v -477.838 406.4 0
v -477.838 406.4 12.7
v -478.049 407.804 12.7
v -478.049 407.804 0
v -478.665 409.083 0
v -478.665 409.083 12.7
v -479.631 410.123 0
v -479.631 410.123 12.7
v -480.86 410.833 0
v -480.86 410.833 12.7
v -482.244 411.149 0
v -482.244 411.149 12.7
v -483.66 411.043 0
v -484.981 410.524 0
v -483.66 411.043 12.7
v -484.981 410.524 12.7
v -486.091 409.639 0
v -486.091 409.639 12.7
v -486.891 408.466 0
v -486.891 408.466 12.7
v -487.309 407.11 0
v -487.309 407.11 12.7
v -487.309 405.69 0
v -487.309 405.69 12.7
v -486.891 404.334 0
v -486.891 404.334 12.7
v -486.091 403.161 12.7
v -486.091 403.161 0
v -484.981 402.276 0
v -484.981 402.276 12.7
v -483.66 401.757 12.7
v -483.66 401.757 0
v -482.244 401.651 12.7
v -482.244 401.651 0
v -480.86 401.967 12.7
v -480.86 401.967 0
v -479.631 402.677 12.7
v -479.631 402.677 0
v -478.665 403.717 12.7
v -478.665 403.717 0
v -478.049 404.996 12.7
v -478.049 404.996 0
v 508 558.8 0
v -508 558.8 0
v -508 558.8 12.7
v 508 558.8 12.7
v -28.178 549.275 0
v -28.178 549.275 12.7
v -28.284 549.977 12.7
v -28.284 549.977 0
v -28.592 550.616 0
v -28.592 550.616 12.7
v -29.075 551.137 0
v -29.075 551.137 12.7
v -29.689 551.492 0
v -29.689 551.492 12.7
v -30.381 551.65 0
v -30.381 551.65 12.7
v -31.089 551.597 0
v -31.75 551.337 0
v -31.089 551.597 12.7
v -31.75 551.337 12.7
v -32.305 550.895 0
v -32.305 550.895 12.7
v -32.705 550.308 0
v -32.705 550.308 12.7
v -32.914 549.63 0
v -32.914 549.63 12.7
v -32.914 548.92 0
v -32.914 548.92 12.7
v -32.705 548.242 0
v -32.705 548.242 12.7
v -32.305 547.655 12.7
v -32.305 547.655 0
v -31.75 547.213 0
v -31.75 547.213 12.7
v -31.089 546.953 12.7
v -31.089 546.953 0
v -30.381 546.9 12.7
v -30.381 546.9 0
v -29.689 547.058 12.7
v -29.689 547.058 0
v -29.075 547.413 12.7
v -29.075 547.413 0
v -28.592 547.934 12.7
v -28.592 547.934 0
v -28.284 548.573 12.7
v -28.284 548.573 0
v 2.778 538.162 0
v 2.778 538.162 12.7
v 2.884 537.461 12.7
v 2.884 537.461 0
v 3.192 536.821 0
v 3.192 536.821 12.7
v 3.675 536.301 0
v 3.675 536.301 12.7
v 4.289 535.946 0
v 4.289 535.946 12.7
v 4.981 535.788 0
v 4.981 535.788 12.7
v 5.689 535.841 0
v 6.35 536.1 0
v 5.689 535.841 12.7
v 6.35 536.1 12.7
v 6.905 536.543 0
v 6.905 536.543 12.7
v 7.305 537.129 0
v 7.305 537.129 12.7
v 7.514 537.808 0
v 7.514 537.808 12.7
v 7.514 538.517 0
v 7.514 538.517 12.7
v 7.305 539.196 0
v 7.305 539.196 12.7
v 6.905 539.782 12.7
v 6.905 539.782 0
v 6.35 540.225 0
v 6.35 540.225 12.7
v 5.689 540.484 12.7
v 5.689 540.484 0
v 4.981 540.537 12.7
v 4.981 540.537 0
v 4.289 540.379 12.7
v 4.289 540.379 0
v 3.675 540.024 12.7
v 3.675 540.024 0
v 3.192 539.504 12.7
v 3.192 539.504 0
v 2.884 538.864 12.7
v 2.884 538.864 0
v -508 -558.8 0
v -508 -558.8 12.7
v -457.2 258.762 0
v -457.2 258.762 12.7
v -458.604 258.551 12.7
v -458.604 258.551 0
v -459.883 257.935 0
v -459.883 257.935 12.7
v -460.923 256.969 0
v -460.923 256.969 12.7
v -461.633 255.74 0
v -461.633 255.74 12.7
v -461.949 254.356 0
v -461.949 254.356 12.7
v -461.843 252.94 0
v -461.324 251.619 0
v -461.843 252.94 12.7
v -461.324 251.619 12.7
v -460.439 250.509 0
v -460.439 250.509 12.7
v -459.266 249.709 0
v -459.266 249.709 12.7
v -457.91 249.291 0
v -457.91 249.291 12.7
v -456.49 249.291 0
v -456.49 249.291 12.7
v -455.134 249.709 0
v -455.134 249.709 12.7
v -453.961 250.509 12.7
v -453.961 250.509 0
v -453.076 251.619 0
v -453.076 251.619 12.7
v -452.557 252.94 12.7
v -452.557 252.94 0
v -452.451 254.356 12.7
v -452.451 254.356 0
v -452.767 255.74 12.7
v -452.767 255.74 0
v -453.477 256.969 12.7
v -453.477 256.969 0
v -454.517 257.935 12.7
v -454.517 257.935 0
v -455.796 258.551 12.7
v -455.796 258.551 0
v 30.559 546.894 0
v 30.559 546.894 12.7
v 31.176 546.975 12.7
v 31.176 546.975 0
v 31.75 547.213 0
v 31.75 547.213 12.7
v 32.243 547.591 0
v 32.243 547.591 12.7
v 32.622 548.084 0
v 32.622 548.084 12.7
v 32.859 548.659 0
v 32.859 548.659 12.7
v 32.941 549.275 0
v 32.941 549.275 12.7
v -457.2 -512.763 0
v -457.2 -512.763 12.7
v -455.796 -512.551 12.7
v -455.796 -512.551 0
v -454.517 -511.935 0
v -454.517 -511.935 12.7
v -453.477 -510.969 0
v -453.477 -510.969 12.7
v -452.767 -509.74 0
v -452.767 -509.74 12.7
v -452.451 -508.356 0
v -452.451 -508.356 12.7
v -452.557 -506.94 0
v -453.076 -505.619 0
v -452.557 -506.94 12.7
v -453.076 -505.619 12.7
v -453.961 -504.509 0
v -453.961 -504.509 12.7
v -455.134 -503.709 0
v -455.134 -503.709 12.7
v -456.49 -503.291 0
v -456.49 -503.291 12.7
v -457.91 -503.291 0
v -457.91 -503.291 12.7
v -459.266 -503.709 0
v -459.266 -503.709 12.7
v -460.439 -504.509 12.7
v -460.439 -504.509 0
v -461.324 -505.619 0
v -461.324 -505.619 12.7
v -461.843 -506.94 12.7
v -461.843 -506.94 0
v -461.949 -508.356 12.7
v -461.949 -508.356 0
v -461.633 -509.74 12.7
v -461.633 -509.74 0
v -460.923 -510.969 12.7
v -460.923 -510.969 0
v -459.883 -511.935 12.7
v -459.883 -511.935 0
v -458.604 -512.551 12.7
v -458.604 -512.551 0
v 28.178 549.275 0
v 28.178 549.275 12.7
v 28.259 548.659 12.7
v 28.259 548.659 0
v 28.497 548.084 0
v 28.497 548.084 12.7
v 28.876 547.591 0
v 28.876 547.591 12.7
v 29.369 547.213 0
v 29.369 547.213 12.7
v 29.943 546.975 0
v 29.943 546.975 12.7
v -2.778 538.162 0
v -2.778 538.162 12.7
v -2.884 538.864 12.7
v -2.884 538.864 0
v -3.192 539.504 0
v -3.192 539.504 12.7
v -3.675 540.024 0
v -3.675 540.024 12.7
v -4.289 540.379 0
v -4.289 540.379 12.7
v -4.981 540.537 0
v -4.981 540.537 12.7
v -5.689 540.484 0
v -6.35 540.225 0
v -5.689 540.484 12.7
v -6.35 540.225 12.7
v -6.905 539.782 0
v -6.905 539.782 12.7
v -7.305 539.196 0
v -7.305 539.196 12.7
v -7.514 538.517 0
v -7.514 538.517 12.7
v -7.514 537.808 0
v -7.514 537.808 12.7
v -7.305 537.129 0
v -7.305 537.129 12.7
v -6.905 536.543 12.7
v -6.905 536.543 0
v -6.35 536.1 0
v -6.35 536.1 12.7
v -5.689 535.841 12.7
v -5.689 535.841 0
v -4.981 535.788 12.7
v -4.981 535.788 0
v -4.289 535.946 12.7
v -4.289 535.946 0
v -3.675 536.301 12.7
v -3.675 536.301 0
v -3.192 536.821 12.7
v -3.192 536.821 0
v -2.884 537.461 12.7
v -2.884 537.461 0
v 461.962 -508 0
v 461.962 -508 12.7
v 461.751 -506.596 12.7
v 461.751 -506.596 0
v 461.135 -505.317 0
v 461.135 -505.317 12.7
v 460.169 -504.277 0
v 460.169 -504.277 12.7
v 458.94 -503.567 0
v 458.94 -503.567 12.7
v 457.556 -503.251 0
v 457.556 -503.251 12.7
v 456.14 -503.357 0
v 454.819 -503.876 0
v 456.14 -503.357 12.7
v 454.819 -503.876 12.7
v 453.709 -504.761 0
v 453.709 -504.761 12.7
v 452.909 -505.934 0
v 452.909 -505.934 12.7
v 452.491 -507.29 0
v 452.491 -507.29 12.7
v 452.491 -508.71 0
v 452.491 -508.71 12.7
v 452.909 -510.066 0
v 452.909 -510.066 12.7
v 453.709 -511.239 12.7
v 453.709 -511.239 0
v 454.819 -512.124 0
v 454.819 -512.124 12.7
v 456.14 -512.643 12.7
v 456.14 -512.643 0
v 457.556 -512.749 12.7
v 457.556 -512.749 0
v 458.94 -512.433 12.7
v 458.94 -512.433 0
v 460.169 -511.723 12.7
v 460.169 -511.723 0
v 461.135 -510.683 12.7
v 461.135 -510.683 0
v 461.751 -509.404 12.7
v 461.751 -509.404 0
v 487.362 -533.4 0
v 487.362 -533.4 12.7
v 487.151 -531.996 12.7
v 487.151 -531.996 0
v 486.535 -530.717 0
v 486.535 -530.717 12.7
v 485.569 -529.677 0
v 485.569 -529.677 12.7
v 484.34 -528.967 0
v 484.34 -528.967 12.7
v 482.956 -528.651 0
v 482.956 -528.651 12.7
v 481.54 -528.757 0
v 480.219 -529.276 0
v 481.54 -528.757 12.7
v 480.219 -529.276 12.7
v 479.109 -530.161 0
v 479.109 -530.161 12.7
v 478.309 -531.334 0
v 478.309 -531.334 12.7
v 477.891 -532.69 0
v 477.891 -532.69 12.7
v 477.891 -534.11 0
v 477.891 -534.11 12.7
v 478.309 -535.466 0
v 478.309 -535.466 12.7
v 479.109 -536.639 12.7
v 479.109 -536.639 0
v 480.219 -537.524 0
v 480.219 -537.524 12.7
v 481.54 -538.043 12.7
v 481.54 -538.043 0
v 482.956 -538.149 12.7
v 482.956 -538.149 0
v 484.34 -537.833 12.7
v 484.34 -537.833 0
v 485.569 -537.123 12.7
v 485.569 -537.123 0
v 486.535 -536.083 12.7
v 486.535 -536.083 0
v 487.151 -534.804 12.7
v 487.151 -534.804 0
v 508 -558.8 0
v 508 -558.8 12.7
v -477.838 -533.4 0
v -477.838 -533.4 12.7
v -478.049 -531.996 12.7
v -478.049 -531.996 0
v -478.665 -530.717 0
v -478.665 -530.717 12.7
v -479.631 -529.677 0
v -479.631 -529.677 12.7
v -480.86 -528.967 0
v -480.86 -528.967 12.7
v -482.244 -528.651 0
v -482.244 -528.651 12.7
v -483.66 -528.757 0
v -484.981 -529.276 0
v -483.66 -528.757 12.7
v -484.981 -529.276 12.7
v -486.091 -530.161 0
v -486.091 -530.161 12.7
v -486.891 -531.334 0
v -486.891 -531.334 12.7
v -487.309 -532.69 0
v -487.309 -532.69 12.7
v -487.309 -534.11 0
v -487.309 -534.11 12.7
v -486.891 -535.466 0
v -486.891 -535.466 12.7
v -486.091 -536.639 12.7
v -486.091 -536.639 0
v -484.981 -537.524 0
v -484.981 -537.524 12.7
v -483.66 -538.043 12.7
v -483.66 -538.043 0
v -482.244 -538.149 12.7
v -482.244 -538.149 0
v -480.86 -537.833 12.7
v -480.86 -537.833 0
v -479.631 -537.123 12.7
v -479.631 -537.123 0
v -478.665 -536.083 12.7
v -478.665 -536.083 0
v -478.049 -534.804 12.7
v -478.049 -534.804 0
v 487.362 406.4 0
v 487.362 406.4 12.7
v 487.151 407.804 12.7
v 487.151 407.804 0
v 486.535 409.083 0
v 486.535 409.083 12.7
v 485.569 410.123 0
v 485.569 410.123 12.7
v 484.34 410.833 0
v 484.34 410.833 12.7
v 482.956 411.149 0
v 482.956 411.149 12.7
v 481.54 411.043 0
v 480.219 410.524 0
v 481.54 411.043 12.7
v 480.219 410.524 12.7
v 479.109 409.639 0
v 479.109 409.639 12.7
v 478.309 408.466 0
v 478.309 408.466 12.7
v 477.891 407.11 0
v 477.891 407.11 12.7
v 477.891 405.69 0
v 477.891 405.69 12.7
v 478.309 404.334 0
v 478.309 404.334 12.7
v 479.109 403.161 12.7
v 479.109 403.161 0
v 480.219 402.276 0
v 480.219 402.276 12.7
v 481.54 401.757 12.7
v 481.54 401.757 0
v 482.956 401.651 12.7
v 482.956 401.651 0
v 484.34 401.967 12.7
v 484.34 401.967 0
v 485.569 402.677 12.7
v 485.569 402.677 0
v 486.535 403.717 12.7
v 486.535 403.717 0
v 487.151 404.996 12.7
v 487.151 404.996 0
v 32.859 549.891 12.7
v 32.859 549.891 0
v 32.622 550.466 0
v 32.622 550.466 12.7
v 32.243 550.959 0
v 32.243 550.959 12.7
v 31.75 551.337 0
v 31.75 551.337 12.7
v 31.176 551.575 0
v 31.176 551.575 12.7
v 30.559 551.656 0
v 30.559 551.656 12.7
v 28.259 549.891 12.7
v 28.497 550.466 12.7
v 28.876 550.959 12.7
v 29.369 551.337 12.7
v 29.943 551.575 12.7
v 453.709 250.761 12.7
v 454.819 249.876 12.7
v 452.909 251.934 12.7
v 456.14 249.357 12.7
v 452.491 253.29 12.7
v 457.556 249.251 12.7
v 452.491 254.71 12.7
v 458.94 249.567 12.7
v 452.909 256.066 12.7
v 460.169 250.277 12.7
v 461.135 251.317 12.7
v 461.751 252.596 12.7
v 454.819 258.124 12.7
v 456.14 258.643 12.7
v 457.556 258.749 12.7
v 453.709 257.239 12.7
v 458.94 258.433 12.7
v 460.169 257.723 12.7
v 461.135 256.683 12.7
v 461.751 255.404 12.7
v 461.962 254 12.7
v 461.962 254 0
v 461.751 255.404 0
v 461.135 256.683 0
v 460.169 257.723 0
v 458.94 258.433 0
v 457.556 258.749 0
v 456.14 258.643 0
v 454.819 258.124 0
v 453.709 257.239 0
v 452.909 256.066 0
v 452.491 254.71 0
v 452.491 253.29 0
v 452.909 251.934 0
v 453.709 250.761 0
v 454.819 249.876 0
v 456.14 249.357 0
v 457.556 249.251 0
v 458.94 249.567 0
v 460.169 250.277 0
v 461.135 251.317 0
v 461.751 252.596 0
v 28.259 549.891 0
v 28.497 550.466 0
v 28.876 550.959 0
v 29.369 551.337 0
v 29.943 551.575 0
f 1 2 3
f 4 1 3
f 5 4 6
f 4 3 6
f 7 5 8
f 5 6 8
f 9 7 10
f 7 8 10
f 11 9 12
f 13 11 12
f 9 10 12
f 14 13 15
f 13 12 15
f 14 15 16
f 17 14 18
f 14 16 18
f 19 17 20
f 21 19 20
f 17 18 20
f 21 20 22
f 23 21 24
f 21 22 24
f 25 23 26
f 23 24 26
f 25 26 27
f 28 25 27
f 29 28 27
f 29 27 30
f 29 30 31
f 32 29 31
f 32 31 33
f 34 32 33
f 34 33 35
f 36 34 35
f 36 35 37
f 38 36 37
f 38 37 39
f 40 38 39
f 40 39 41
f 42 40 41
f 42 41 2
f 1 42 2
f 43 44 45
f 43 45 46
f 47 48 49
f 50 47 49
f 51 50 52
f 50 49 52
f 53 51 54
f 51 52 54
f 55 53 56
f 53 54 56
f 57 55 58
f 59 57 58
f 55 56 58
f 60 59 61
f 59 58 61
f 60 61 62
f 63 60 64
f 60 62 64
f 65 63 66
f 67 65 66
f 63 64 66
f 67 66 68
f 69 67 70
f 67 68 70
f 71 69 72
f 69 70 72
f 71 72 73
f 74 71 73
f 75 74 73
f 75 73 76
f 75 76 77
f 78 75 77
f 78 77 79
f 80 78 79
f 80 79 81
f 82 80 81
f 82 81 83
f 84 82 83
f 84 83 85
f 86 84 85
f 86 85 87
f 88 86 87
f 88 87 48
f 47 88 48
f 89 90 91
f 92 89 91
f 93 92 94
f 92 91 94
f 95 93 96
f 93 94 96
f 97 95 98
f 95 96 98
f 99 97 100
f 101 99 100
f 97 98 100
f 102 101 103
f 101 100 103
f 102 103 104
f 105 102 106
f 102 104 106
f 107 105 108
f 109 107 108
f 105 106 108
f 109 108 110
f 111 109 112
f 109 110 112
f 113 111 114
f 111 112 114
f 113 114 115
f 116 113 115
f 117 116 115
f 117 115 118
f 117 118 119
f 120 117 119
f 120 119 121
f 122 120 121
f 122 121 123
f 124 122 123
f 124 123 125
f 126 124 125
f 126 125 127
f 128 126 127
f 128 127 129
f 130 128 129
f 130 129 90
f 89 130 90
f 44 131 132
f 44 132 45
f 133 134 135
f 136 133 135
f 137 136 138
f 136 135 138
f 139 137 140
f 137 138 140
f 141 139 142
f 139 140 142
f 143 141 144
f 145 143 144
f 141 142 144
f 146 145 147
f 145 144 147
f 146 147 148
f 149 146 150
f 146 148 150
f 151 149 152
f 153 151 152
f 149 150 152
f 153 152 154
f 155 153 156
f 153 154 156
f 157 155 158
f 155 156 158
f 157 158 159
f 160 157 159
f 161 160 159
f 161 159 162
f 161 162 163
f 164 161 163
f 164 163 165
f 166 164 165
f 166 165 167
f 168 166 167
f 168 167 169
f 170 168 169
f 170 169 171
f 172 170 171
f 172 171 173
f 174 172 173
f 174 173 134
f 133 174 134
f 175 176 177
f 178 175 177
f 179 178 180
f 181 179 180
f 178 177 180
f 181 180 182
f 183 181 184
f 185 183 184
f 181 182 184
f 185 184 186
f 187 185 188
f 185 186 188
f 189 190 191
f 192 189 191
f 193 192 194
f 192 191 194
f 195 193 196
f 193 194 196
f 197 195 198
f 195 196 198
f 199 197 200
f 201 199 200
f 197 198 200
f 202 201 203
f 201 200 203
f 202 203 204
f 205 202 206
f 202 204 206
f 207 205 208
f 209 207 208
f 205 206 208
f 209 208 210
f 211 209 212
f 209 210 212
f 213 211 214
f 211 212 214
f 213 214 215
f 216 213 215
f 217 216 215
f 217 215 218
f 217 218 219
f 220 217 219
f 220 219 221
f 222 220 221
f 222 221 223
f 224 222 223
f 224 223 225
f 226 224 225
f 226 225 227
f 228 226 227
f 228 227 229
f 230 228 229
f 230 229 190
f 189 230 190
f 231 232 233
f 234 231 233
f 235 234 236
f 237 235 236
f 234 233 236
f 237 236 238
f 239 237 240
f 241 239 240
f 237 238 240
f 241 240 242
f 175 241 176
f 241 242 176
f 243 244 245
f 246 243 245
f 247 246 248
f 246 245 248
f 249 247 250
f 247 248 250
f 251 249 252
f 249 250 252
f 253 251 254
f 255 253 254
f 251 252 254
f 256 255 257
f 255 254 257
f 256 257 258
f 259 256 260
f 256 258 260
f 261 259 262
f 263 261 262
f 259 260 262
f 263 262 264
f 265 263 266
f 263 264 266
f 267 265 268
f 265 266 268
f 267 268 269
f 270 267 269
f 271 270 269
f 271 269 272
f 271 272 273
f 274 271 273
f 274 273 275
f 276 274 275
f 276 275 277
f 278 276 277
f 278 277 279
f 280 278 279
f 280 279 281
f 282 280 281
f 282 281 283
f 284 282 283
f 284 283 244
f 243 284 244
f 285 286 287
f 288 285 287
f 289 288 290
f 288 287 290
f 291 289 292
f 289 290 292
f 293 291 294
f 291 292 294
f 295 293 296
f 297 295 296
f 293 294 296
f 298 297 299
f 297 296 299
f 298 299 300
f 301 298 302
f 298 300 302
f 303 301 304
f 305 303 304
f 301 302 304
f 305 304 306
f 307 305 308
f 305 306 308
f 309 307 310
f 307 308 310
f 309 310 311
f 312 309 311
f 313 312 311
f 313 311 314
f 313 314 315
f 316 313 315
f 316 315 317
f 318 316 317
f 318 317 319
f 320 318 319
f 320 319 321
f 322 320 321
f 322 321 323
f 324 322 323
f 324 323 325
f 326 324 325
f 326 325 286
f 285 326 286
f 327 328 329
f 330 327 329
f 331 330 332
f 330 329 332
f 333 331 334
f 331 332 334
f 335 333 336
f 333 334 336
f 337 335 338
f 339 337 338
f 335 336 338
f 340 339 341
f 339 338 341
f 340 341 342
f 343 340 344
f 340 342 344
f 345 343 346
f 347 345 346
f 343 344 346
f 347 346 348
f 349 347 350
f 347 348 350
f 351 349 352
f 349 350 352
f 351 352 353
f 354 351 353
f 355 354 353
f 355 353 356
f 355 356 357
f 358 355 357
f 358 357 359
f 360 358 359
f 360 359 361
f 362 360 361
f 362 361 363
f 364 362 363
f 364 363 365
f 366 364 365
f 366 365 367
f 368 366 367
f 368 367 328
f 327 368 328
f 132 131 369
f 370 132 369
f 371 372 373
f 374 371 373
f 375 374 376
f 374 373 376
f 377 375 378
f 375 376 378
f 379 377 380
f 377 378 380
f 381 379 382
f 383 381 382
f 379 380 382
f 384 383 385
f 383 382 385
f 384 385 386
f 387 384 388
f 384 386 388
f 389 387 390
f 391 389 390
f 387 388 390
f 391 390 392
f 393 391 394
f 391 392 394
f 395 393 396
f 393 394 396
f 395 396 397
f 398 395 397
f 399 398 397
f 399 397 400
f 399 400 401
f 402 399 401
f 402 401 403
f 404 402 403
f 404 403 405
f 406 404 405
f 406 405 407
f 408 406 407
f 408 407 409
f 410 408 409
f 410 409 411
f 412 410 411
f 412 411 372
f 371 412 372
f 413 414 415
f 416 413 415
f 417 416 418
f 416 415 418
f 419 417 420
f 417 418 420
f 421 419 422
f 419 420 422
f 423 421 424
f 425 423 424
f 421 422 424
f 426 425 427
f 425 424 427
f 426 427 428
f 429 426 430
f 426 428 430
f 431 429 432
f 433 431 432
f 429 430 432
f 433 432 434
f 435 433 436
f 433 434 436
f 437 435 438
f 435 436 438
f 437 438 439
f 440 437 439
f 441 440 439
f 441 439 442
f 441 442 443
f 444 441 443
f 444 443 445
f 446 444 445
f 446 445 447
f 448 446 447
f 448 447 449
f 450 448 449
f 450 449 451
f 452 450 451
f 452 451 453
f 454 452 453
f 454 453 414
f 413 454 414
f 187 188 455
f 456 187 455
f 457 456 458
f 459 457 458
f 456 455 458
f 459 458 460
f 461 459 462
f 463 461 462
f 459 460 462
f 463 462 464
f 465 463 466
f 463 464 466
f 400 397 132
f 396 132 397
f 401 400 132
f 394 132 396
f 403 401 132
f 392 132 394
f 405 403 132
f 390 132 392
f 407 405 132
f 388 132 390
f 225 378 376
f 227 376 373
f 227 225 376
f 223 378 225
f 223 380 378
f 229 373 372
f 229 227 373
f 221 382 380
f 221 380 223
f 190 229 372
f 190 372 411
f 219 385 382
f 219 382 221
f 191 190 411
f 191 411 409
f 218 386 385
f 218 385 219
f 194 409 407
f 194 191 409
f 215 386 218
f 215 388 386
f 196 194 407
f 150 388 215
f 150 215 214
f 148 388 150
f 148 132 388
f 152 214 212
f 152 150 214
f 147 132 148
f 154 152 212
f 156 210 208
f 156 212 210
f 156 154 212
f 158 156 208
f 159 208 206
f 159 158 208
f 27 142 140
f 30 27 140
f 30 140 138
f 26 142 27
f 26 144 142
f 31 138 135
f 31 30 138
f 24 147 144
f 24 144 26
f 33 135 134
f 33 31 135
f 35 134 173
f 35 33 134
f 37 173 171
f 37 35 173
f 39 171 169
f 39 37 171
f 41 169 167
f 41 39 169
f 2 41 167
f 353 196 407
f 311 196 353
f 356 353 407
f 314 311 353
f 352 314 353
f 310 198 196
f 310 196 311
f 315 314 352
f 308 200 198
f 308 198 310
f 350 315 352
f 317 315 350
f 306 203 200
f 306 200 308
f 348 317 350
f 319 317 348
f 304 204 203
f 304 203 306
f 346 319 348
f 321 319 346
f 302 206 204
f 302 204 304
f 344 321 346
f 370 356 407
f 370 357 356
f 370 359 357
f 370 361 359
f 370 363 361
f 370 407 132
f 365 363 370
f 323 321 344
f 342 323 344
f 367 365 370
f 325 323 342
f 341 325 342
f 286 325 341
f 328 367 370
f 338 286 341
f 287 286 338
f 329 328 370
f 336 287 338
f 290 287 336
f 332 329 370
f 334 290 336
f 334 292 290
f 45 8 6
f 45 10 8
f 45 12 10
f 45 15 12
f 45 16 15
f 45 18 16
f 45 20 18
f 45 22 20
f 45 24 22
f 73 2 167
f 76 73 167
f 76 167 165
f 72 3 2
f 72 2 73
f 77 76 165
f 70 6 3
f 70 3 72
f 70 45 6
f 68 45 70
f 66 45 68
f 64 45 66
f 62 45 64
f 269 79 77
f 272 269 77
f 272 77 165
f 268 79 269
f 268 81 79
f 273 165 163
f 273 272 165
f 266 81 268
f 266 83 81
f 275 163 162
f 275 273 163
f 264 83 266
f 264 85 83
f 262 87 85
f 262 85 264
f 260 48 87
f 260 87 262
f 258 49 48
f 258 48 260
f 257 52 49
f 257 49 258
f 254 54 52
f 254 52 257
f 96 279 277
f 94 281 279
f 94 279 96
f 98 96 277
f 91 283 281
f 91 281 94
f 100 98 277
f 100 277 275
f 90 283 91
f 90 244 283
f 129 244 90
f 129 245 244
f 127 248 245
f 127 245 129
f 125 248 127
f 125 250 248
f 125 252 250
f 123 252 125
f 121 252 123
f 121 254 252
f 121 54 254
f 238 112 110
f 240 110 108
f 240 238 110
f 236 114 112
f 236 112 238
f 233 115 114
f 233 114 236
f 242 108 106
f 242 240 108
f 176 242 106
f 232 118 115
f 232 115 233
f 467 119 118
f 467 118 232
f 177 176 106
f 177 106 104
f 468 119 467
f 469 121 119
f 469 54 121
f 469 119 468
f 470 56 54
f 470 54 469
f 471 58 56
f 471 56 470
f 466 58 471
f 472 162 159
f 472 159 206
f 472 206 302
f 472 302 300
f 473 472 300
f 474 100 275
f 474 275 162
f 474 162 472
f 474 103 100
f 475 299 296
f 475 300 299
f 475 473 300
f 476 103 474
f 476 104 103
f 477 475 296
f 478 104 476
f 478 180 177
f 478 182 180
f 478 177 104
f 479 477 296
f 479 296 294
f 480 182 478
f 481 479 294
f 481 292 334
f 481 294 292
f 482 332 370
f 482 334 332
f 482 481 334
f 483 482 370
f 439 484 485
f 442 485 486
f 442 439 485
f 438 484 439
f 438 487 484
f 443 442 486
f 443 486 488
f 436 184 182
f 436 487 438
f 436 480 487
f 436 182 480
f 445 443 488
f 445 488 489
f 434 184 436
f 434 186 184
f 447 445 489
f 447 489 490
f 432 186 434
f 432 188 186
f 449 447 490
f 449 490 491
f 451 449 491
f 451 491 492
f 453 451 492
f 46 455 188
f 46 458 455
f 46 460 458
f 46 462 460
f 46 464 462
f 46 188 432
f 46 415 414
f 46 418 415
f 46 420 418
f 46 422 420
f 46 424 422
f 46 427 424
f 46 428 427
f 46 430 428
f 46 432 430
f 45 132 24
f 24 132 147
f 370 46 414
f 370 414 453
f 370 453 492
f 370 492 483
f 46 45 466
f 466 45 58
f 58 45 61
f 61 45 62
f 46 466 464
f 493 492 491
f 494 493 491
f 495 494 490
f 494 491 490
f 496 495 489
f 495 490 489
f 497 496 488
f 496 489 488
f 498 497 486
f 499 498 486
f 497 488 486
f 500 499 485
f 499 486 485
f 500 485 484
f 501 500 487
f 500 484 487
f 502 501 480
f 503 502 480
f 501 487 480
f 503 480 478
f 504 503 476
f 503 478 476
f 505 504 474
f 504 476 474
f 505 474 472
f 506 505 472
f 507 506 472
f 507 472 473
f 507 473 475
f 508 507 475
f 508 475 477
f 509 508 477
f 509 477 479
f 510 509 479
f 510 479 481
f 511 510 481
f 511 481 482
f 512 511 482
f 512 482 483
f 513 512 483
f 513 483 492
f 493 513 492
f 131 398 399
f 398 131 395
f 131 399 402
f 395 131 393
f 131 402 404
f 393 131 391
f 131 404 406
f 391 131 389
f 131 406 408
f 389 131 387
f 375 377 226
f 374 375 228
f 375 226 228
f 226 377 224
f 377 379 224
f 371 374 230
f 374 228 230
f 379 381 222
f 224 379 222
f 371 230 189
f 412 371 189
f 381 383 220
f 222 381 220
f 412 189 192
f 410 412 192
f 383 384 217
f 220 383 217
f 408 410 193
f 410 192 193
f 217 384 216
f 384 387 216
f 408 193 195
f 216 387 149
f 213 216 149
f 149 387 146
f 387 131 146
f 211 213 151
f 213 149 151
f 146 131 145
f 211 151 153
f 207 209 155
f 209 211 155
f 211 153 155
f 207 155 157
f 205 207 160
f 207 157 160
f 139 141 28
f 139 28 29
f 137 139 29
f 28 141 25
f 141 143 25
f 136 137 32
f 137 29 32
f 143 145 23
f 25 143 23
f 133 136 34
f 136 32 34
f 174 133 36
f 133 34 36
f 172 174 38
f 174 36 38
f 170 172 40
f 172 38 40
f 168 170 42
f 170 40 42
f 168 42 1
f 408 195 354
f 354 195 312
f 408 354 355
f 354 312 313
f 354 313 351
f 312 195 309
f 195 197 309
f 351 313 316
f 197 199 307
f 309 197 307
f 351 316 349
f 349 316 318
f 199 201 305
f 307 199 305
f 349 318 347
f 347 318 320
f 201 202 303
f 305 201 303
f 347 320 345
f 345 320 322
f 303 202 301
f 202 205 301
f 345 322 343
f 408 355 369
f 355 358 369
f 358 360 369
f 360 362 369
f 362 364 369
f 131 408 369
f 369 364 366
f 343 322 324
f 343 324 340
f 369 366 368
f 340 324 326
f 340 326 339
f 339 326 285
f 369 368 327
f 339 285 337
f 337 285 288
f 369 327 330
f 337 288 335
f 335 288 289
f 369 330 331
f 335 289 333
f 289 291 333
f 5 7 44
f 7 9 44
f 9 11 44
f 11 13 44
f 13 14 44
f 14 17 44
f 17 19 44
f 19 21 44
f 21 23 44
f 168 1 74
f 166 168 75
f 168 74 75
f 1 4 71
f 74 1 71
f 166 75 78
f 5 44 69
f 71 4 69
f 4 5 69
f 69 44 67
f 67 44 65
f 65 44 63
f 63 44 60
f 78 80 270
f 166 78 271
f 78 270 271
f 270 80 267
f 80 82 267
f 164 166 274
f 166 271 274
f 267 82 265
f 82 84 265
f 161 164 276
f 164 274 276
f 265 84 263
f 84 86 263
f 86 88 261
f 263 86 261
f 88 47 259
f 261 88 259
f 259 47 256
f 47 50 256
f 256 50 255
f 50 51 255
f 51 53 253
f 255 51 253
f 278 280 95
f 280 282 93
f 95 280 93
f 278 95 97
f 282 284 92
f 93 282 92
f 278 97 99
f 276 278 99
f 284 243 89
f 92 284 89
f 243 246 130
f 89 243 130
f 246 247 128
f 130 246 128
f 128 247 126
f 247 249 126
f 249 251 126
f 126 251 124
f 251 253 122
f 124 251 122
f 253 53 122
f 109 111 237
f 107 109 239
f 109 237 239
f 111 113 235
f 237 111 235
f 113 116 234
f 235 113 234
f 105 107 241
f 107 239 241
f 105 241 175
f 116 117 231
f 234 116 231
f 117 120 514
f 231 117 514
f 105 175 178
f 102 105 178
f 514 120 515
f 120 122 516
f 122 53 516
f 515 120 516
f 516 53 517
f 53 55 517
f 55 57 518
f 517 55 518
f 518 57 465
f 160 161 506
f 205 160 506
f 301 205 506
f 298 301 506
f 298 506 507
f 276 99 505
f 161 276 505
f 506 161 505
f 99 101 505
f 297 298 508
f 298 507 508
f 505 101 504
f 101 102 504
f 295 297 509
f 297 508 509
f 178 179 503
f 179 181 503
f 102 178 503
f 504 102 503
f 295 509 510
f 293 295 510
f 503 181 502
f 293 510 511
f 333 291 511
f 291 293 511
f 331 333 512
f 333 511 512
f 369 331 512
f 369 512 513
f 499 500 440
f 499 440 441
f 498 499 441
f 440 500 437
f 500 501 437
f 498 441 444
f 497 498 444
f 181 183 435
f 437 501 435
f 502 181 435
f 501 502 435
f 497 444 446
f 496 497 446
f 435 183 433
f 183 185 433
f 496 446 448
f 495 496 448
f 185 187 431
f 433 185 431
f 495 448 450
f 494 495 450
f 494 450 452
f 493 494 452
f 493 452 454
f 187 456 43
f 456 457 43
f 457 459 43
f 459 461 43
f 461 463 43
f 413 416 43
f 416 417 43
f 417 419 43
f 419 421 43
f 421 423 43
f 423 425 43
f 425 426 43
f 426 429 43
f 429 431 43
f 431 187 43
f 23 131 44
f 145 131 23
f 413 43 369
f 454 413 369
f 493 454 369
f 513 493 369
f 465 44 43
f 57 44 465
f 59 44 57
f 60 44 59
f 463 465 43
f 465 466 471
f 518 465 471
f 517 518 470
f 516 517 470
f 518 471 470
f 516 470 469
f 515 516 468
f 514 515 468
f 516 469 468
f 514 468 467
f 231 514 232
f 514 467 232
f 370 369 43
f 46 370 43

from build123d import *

# Parameters (mm, degrees)
F0_W     = 1016
F0_H     = 1117.6
F1_DEPTH = 12.7
F3_DEPTH = 25.4
F4_R     = 4.7625
F5_DEPTH = 25.4


# Not quite as in the source:
# - a feature names something its author has since deleted; it is built from what else it names


with BuildPart() as f1:
    # F0 (on Top) → F1 (new body)
    with BuildSketch(Plane.XY):
        Rectangle(F0_W, F0_H)
    extrude(amount=F1_DEPTH)

    # F2 (on face) → F3 (cut)
    with BuildSketch(Plane.XY.offset(12.7)):
        with BuildLine():
            Line((-30.559375, 549.275), (-30.559375, 551.65625))
            ThreePointArc((-30.559375, 551.65625), (-32.940625, 549.275), (-30.559375, 546.89375))
            Line((-30.559375, 546.89375), (-30.559375, 549.275))
        make_face()
        with BuildLine():
            ThreePointArc((-28.178125, 549.275), (-28.8755769773, 550.9587980227), (-30.559375, 551.65625))
            Line((-30.559375, 551.65625), (-30.559375, 549.275))
            Line((-30.559375, 549.275), (-28.178125, 549.275))
        make_face()
        with BuildLine():
            Line((-28.178125, 549.275), (-30.559375, 549.275))
            Line((-30.559375, 549.275), (-30.559375, 546.89375))
            ThreePointArc((-30.559375, 546.89375), (-28.8755769773, 547.5912019773), (-28.178125, 549.275))
        make_face()
        with BuildLine():
            Line((-5.159375, 538.1625), (-7.540625, 538.1625))
            ThreePointArc((-7.540625, 538.1625), (-5.159375, 535.78125), (-2.778125, 538.1625))
            Line((-2.778125, 538.1625), (-5.159375, 538.1625))
        make_face()
        with BuildLine():
            ThreePointArc((-2.778125, 538.1625), (-5.159375, 540.54375), (-7.540625, 538.1625))
            Line((-7.540625, 538.1625), (-5.159375, 538.1625))
            Line((-5.159375, 538.1625), (-2.778125, 538.1625))
        make_face()
        with BuildLine():
            Line((5.159375, 538.1625), (7.540625, 538.1625))
            ThreePointArc((7.540625, 538.1625), (5.159375, 540.54375), (2.778125, 538.1625))
            Line((2.778125, 538.1625), (5.159375, 538.1625))
        make_face()
        with BuildLine():
            ThreePointArc((2.778125, 538.1625), (5.159375, 535.78125), (7.540625, 538.1625))
            Line((7.540625, 538.1625), (5.159375, 538.1625))
            Line((5.159375, 538.1625), (2.778125, 538.1625))
        make_face()
        with BuildLine():
            Line((30.559375, 549.275), (30.559375, 551.65625))
            ThreePointArc((30.559375, 551.65625), (28.8755769773, 550.9587980227), (28.178125, 549.275))
            Line((28.178125, 549.275), (30.559375, 549.275))
        make_face()
        with BuildLine():
            Line((30.559375, 546.89375), (30.559375, 549.275))
            Line((30.559375, 549.275), (28.178125, 549.275))
            ThreePointArc((28.178125, 549.275), (28.8755769773, 547.5912019773), (30.559375, 546.89375))
        make_face()
        with BuildLine():
            ThreePointArc((32.940625, 549.275), (32.2431730227, 550.9587980227), (30.559375, 551.65625))
            Line((30.559375, 551.65625), (30.559375, 549.275))
            Line((30.559375, 549.275), (30.559375, 546.89375))
            ThreePointArc((30.559375, 546.89375), (32.2431730227, 547.5912019773), (32.940625, 549.275))
        make_face()
    extrude(amount=-F3_DEPTH, mode=Mode.SUBTRACT)

    # F4 (on face) → F5 (cut)
    with BuildSketch(Plane.XY.offset(12.7)):
        with Locations((-482.6, 406.4)):
            Circle(F4_R)
        with BuildLine():
            Line((-457.2, 254), (-461.9625, 254))
            ThreePointArc((-461.9625, 254), (-457.2, 249.2375), (-452.4375, 254))
            ThreePointArc((-452.4375, 254), (-453.8324039546, 257.3675960454), (-457.2, 258.7625))
            Line((-457.2, 258.7625), (-457.2, 254))
        make_face()
        with BuildLine():
            ThreePointArc((-457.2, 258.7625), (-460.5675960454, 257.3675960454), (-461.9625, 254))
            Line((-461.9625, 254), (-457.2, 254))
            Line((-457.2, 254), (-457.2, 258.7625))
        make_face()
        with Locations((-482.6, -533.4)):
            Circle(F4_R)
        with BuildLine():
            Line((-457.2, -508), (-457.2, -512.7625))
            ThreePointArc((-457.2, -512.7625), (-453.8324039546, -511.3675960454), (-452.4375, -508))
            ThreePointArc((-452.4375, -508), (-457.2, -503.2375), (-461.9625, -508))
            Line((-461.9625, -508), (-457.2, -508))
        make_face()
        with BuildLine():
            ThreePointArc((-461.9625, -508), (-460.5675960454, -511.3675960454), (-457.2, -512.7625))
            Line((-457.2, -512.7625), (-457.2, -508))
            Line((-457.2, -508), (-461.9625, -508))
        make_face()
        with Locations((482.6, -533.4)):
            Circle(F4_R)
        with BuildLine():
            Line((457.2, -508), (457.2, -512.7625))
            ThreePointArc((457.2, -512.7625), (460.5675960454, -511.3675960454), (461.9625, -508))
            Line((461.9625, -508), (457.2, -508))
        make_face()
        with BuildLine():
            ThreePointArc((461.9625, -508), (453.8324039546, -504.6324039546), (457.2, -512.7625))
            Line((457.2, -512.7625), (457.2, -508))
            Line((457.2, -508), (461.9625, -508))
        make_face()
        with BuildLine():
            ThreePointArc((457.2, 258.7625), (453.8324039546, 250.6324039546), (461.9625, 254))
            Line((461.9625, 254), (457.2, 254))
            Line((457.2, 254), (457.2, 258.7625))
        make_face()
        with BuildLine():
            Line((457.2, 254), (461.9625, 254))
            ThreePointArc((461.9625, 254), (460.5675960454, 257.3675960454), (457.2, 258.7625))
            Line((457.2, 258.7625), (457.2, 254))
        make_face()
        with Locations((482.6, 406.4)):
            Circle(F4_R)
    extrude(amount=-F5_DEPTH, mode=Mode.SUBTRACT)


solid = f1.part
